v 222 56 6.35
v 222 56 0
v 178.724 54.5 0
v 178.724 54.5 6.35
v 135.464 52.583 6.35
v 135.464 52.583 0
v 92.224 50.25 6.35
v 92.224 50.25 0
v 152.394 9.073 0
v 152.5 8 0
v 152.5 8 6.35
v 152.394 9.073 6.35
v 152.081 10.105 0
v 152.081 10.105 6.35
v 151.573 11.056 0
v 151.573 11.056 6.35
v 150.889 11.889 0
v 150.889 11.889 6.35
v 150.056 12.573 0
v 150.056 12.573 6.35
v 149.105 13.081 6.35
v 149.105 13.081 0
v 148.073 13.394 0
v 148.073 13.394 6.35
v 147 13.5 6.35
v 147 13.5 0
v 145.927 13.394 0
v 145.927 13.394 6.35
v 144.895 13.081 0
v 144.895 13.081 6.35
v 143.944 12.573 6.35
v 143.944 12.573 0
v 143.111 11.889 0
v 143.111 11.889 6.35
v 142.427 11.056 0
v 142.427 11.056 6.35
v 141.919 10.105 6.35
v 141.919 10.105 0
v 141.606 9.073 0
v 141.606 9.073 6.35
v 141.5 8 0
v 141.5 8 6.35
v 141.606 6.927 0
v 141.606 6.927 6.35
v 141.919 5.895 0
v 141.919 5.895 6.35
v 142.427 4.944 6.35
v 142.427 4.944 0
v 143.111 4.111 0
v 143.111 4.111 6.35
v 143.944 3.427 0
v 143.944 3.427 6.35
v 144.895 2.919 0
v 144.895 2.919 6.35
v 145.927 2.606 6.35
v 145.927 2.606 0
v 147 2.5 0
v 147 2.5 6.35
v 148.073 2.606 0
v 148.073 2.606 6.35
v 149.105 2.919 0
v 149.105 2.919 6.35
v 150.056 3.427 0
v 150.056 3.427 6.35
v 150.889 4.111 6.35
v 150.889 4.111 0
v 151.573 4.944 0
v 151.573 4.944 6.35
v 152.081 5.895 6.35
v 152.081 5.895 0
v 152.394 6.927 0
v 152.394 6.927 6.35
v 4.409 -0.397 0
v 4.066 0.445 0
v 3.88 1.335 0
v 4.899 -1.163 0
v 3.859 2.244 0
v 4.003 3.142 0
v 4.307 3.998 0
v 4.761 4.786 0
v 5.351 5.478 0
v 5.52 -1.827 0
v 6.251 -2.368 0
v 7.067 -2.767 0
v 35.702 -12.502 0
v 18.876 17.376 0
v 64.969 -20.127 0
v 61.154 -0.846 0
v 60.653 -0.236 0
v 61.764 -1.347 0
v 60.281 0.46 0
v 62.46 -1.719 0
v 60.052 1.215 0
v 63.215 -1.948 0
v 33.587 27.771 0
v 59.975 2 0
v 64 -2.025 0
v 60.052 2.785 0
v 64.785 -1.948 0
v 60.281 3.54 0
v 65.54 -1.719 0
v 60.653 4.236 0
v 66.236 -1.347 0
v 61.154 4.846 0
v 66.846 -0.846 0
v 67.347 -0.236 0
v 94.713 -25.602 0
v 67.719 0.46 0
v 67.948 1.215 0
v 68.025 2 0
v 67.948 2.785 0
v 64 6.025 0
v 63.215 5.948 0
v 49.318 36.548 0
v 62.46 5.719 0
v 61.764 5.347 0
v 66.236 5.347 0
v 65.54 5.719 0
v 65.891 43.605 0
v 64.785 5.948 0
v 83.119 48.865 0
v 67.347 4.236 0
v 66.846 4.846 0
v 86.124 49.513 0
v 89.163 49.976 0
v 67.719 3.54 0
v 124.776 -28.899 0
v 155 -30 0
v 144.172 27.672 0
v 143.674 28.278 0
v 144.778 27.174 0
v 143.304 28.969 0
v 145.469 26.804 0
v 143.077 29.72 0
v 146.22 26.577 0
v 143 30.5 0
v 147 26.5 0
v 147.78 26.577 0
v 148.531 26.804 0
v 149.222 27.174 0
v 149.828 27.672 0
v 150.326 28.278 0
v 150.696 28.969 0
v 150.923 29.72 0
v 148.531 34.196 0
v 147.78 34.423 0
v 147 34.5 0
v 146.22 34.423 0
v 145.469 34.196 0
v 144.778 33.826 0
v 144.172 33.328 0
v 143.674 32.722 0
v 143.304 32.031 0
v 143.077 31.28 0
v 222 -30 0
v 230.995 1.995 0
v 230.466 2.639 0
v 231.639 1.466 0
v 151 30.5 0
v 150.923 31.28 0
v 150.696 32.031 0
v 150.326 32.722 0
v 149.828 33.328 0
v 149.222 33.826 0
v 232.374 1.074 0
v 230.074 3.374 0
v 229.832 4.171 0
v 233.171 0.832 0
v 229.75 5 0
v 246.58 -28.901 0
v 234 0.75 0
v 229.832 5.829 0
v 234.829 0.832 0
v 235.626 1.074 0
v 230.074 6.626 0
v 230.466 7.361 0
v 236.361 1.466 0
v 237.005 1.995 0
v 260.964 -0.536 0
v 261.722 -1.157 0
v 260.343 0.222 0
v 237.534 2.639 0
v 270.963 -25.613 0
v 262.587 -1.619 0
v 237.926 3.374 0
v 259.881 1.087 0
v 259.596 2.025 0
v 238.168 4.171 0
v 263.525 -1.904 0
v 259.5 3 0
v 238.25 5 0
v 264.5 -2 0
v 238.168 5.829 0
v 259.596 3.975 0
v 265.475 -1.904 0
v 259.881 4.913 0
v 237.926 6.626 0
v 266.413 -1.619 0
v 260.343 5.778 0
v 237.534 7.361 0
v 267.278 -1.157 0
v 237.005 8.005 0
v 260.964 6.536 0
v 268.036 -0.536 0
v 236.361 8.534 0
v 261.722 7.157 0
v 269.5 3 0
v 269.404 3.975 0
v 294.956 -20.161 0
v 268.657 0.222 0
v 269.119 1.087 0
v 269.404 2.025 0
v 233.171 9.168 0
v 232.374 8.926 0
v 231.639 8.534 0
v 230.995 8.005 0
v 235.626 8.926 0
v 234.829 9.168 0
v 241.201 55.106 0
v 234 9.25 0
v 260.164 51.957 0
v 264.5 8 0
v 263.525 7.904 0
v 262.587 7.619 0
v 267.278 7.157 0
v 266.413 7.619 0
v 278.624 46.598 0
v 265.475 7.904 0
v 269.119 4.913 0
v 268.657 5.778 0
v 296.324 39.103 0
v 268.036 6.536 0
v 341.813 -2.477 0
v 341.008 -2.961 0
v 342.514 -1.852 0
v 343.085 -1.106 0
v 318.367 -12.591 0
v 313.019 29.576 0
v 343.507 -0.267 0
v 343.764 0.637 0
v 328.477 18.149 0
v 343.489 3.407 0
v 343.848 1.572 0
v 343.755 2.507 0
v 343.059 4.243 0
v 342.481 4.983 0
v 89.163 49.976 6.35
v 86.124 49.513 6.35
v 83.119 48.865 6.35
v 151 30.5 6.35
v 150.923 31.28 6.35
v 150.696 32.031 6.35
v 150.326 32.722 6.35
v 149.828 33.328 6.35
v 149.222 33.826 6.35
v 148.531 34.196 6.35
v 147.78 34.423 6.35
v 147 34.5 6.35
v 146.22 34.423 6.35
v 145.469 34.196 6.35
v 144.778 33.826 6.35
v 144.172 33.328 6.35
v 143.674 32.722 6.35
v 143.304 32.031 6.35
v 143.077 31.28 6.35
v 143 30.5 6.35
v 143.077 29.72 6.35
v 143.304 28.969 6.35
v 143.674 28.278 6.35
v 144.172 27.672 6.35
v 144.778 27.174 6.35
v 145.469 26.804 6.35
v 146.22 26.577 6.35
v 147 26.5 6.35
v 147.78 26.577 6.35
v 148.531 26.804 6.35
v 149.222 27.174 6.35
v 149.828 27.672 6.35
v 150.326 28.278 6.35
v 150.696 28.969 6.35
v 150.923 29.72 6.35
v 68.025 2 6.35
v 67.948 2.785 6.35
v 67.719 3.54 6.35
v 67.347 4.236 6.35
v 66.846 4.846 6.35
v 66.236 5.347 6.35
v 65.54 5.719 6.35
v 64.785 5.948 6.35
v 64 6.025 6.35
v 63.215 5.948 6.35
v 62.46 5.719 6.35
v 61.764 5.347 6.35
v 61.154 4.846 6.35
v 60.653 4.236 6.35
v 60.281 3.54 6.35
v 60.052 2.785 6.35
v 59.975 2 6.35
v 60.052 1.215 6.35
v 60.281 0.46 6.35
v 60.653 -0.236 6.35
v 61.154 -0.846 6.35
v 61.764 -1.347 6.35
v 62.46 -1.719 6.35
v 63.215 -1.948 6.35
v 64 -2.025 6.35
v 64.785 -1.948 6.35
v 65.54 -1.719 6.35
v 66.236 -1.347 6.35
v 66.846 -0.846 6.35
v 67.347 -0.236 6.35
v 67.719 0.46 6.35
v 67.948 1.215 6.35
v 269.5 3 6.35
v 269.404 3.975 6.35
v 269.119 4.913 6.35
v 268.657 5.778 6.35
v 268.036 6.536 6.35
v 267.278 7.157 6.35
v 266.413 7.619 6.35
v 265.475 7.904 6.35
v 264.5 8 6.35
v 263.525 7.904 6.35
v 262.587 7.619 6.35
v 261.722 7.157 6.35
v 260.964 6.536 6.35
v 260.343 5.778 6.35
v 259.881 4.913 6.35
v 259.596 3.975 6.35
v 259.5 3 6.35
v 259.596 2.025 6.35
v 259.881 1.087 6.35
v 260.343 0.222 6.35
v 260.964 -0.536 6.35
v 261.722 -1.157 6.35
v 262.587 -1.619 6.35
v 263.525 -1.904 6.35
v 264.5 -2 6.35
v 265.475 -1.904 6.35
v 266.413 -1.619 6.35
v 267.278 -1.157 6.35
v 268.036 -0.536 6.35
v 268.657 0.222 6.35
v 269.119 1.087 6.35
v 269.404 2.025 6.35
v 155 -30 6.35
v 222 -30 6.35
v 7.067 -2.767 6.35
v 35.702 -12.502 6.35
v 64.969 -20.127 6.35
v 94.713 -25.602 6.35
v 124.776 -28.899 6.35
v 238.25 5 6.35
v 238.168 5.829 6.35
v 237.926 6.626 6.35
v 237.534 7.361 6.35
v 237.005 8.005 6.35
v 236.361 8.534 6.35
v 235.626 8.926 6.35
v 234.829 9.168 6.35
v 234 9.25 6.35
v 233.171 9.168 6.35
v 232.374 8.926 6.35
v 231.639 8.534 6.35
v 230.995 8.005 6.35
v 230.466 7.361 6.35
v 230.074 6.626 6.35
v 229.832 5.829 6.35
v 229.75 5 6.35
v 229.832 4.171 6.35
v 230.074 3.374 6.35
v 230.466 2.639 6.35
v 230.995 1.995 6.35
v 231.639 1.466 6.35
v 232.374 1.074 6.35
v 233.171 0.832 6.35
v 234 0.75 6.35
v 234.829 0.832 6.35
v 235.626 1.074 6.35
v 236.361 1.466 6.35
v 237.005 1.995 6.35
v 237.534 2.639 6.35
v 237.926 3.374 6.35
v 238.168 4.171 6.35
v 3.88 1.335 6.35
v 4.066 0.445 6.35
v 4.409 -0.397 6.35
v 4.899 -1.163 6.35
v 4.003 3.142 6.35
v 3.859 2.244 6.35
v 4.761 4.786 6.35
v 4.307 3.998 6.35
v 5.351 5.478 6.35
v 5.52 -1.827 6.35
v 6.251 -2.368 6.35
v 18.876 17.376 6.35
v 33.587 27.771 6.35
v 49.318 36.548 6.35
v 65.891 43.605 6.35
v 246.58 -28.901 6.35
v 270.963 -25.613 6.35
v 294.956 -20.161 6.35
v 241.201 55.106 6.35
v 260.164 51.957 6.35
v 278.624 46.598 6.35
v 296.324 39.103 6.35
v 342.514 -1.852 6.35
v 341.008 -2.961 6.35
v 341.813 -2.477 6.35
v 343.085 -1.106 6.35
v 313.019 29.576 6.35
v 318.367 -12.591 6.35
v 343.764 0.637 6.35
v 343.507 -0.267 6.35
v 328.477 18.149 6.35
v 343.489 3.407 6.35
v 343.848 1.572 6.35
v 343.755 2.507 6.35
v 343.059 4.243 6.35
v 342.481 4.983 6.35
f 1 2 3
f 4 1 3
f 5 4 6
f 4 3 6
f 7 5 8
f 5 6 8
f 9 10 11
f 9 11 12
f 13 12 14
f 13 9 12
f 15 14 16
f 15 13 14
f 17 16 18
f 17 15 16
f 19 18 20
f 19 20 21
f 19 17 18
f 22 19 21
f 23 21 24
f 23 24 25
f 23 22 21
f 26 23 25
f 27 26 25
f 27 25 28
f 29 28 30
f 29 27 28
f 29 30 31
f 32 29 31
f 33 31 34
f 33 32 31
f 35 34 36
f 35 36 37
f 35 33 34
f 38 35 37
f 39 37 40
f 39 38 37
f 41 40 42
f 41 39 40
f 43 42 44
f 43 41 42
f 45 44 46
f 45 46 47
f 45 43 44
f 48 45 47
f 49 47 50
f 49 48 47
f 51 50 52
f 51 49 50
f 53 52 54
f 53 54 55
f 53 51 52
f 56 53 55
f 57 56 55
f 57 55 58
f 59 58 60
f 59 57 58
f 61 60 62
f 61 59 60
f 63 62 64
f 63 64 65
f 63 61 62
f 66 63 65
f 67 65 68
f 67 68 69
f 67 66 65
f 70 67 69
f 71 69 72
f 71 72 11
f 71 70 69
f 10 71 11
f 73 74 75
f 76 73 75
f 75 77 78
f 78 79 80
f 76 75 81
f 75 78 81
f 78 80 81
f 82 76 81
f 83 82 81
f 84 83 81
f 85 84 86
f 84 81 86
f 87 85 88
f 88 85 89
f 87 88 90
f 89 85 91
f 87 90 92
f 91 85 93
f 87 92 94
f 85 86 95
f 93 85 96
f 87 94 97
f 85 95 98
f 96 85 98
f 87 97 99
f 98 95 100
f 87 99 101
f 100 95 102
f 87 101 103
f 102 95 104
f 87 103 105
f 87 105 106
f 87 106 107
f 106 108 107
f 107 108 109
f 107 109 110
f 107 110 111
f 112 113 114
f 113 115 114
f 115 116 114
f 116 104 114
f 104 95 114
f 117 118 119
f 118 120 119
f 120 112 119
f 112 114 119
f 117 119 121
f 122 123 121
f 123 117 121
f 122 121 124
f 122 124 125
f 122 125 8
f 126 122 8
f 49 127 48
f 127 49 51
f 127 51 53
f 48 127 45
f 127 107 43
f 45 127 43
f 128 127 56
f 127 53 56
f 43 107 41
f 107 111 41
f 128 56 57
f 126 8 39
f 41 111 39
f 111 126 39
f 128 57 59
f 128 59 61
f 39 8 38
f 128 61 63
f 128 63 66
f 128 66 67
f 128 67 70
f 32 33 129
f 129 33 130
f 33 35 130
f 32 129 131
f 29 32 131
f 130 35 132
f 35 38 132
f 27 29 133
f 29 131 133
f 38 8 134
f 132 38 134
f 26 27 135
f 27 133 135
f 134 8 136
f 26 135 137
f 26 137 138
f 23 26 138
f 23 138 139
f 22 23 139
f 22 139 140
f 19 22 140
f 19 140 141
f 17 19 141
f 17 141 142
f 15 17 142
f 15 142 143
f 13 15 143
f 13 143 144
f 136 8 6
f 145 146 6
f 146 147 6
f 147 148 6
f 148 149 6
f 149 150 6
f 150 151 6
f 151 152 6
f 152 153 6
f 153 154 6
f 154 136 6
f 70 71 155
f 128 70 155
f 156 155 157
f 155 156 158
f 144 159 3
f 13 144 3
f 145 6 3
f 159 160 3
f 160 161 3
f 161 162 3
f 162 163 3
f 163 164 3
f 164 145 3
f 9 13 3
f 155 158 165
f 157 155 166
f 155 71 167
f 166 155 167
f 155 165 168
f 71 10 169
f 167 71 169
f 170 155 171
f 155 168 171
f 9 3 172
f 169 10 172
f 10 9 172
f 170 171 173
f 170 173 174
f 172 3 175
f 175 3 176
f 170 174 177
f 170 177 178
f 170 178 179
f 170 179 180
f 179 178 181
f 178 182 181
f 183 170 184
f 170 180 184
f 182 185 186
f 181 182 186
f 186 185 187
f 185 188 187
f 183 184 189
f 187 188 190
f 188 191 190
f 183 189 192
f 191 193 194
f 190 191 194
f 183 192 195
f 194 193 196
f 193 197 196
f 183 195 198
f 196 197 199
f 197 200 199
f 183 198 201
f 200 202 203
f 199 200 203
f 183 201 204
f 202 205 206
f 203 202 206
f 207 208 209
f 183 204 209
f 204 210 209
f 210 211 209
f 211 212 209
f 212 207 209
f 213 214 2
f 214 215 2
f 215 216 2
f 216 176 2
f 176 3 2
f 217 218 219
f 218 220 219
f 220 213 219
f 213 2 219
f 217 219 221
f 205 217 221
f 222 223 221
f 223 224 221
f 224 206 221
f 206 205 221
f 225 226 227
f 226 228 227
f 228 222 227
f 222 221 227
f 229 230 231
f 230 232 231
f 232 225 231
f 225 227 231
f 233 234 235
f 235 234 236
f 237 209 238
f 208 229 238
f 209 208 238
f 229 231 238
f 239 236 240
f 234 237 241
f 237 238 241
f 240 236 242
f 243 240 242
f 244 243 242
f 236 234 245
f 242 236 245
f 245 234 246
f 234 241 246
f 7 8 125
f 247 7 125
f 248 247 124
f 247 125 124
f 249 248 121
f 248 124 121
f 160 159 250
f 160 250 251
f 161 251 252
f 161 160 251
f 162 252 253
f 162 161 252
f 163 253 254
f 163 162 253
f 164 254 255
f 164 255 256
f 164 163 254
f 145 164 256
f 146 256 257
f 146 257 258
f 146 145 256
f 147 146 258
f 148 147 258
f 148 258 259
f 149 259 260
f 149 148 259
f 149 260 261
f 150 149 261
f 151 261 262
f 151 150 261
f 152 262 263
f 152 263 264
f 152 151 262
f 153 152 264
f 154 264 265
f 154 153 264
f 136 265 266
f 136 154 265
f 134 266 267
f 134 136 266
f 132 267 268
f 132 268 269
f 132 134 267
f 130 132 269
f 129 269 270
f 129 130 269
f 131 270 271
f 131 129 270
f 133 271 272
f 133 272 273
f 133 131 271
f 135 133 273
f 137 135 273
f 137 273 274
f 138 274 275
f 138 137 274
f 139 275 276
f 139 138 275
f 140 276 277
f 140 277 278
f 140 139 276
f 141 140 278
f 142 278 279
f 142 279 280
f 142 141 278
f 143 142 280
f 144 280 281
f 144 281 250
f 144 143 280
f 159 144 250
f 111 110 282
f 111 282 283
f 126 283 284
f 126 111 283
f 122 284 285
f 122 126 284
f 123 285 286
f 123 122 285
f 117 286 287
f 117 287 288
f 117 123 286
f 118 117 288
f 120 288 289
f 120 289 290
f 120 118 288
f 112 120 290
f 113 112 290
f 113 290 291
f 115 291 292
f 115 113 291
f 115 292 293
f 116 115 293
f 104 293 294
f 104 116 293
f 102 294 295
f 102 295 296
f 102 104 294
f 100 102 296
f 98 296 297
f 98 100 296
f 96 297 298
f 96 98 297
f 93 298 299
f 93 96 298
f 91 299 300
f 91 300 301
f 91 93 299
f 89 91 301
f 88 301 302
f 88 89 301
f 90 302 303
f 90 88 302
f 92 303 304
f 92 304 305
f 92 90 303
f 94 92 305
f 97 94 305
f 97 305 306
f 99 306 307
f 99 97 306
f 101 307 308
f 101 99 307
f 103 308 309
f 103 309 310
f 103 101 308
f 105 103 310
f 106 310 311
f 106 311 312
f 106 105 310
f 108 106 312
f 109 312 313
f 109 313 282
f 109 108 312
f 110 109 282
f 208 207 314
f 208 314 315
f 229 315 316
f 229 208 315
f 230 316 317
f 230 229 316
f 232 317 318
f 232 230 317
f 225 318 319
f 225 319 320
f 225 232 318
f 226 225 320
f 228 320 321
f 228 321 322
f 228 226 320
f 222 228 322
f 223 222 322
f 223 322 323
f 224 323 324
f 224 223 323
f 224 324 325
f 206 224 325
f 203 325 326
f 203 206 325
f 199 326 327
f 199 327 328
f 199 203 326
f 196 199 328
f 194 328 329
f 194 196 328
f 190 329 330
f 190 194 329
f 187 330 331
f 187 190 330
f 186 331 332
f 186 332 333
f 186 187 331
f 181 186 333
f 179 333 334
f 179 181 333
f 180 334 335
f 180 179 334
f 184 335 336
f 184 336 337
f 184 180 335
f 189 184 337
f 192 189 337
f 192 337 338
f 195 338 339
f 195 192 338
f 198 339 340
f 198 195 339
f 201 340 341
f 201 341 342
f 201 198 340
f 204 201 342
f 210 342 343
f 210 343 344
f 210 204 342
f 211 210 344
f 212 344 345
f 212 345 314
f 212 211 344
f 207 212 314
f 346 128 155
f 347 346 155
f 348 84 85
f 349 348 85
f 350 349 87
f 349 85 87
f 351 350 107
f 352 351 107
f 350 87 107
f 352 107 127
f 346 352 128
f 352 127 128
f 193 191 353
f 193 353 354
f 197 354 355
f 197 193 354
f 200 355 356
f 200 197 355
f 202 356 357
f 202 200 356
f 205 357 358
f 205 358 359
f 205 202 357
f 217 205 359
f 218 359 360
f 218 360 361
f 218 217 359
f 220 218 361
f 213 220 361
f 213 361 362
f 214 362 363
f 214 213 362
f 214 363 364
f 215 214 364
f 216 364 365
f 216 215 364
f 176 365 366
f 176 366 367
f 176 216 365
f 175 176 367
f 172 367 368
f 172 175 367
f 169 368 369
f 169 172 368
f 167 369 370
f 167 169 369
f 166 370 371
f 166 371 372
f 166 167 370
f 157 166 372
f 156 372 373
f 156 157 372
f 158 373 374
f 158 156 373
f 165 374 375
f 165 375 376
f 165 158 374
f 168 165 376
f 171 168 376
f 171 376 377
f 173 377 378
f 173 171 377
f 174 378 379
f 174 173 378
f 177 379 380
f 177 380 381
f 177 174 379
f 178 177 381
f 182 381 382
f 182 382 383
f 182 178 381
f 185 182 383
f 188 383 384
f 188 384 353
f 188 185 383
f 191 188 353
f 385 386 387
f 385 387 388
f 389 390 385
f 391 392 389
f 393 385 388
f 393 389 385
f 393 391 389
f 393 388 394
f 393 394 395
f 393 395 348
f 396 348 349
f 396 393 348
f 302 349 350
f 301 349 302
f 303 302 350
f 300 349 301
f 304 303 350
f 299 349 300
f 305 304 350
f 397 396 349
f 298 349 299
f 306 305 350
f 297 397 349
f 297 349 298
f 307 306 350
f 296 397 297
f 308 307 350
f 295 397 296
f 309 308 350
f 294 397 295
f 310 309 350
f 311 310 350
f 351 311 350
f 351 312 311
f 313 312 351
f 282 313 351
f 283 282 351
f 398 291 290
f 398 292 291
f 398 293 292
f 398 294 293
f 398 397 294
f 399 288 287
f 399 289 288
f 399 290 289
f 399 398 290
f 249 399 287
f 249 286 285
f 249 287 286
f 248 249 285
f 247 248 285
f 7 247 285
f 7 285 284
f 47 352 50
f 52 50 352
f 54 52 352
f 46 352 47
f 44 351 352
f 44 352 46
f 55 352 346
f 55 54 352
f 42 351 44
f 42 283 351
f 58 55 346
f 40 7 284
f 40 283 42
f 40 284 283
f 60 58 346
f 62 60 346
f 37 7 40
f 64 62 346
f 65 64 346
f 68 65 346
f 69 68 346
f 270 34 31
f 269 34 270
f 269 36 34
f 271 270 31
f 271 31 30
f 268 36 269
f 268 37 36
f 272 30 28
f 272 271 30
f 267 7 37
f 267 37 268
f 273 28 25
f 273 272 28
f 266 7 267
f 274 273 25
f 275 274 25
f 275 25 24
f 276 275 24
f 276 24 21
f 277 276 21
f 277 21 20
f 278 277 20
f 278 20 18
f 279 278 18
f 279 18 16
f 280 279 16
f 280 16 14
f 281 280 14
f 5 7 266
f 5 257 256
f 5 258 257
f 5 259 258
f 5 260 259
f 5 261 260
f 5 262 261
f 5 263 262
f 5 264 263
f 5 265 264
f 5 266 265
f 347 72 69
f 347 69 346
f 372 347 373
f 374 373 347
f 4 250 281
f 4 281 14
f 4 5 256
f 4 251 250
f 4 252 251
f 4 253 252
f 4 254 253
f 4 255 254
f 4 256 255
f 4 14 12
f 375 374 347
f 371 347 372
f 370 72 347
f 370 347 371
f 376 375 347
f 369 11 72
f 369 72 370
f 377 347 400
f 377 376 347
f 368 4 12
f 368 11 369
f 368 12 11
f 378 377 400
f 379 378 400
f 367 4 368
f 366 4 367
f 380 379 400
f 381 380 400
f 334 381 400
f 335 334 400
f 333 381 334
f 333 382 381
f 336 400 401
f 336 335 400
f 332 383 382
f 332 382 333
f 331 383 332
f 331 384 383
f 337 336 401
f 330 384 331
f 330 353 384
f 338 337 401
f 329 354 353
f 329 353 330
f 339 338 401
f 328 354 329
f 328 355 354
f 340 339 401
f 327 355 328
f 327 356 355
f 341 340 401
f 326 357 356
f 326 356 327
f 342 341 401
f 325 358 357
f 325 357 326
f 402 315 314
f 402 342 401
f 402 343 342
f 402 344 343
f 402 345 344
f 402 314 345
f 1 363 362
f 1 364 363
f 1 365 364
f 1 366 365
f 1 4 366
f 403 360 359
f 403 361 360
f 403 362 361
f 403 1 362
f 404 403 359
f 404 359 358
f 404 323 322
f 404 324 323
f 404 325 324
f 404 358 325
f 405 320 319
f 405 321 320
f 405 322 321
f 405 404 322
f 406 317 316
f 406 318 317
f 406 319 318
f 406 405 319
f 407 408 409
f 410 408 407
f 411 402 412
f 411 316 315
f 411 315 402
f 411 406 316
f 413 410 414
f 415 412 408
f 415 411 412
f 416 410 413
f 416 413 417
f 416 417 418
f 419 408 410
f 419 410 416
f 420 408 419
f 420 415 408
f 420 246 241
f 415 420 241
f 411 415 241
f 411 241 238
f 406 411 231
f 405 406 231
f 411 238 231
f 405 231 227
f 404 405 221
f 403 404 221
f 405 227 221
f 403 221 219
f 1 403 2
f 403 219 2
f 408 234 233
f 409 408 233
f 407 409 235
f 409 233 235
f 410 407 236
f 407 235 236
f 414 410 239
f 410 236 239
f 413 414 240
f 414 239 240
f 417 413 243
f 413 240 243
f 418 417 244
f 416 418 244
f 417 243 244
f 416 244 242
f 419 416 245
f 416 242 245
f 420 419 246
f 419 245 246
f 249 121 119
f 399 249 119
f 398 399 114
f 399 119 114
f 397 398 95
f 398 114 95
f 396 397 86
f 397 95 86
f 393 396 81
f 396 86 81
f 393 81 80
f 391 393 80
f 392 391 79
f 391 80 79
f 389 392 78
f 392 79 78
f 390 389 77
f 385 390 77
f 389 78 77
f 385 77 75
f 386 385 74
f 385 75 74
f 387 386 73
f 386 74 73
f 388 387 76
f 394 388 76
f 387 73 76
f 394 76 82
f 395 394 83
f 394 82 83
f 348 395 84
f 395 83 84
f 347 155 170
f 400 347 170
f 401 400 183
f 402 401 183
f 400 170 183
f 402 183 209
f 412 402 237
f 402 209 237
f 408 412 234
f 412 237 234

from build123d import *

# Parameters (mm, degrees)
F0_R     = 4.025
F0_R_2   = 5.5
F0_R_3   = 4.25
F0_R_4   = 5
F0_R_5   = 4
F1_DEPTH = 6.35


# Not quite as in the source:
# - a length typed as a fraction of an inch, garbled in the dataset ("3 / 203.2 mm" for 3/8 in), is restored


with BuildPart() as f1:
    # F0 (on Top) → F1 (new body)
    with BuildSketch(Plane.XY):
        with BuildLine():
            ThreePointArc((7.0672459204, -2.7674484319), (79.7907725168, -23.1351403858), (155, -30))
            Line((155, -30), (222, -30))
            ThreePointArc((222, -30), (283.0205715955, -23.1551675229), (341.0080980578, -2.9608944665))
            ThreePointArc((341.0080980578, -2.9608944665), (343.7637603339, 0.6365005197), (342.4812933157, 4.982786706))
            ThreePointArc((342.4812933157, 4.982786706), (287.5845162749, 43.1113755357), (222, 56))
            ThreePointArc((222, 56), (157.0912257731, 53.5938902672), (92.2239851956, 50.2503239761))
            ThreePointArc((92.2239851956, 50.2503239761), (87.6396110054, 49.7679486163), (83.1191443173, 48.8654223701))
            ThreePointArc((83.1191443173, 48.8654223701), (41.3356630681, 32.3684999851), (5.3506191001, 5.478271944))
            ThreePointArc((5.3506191001, 5.478271944), (3.9527325419, 0.8857070849), (7.0672459204, -2.7674484319))
        make_face()
        with Locations((64, 2)):
            Circle(F0_R, mode=Mode.SUBTRACT)
        with Locations((147, 8)):
            Circle(F0_R_2, mode=Mode.SUBTRACT)
        with Locations((234, 5)):
            Circle(F0_R_3, mode=Mode.SUBTRACT)
        with Locations((264.5, 3)):
            Circle(F0_R_4, mode=Mode.SUBTRACT)
        with Locations((147, 30.5)):
            Circle(F0_R_5, mode=Mode.SUBTRACT)
    extrude(amount=F1_DEPTH)


solid = f1.part
